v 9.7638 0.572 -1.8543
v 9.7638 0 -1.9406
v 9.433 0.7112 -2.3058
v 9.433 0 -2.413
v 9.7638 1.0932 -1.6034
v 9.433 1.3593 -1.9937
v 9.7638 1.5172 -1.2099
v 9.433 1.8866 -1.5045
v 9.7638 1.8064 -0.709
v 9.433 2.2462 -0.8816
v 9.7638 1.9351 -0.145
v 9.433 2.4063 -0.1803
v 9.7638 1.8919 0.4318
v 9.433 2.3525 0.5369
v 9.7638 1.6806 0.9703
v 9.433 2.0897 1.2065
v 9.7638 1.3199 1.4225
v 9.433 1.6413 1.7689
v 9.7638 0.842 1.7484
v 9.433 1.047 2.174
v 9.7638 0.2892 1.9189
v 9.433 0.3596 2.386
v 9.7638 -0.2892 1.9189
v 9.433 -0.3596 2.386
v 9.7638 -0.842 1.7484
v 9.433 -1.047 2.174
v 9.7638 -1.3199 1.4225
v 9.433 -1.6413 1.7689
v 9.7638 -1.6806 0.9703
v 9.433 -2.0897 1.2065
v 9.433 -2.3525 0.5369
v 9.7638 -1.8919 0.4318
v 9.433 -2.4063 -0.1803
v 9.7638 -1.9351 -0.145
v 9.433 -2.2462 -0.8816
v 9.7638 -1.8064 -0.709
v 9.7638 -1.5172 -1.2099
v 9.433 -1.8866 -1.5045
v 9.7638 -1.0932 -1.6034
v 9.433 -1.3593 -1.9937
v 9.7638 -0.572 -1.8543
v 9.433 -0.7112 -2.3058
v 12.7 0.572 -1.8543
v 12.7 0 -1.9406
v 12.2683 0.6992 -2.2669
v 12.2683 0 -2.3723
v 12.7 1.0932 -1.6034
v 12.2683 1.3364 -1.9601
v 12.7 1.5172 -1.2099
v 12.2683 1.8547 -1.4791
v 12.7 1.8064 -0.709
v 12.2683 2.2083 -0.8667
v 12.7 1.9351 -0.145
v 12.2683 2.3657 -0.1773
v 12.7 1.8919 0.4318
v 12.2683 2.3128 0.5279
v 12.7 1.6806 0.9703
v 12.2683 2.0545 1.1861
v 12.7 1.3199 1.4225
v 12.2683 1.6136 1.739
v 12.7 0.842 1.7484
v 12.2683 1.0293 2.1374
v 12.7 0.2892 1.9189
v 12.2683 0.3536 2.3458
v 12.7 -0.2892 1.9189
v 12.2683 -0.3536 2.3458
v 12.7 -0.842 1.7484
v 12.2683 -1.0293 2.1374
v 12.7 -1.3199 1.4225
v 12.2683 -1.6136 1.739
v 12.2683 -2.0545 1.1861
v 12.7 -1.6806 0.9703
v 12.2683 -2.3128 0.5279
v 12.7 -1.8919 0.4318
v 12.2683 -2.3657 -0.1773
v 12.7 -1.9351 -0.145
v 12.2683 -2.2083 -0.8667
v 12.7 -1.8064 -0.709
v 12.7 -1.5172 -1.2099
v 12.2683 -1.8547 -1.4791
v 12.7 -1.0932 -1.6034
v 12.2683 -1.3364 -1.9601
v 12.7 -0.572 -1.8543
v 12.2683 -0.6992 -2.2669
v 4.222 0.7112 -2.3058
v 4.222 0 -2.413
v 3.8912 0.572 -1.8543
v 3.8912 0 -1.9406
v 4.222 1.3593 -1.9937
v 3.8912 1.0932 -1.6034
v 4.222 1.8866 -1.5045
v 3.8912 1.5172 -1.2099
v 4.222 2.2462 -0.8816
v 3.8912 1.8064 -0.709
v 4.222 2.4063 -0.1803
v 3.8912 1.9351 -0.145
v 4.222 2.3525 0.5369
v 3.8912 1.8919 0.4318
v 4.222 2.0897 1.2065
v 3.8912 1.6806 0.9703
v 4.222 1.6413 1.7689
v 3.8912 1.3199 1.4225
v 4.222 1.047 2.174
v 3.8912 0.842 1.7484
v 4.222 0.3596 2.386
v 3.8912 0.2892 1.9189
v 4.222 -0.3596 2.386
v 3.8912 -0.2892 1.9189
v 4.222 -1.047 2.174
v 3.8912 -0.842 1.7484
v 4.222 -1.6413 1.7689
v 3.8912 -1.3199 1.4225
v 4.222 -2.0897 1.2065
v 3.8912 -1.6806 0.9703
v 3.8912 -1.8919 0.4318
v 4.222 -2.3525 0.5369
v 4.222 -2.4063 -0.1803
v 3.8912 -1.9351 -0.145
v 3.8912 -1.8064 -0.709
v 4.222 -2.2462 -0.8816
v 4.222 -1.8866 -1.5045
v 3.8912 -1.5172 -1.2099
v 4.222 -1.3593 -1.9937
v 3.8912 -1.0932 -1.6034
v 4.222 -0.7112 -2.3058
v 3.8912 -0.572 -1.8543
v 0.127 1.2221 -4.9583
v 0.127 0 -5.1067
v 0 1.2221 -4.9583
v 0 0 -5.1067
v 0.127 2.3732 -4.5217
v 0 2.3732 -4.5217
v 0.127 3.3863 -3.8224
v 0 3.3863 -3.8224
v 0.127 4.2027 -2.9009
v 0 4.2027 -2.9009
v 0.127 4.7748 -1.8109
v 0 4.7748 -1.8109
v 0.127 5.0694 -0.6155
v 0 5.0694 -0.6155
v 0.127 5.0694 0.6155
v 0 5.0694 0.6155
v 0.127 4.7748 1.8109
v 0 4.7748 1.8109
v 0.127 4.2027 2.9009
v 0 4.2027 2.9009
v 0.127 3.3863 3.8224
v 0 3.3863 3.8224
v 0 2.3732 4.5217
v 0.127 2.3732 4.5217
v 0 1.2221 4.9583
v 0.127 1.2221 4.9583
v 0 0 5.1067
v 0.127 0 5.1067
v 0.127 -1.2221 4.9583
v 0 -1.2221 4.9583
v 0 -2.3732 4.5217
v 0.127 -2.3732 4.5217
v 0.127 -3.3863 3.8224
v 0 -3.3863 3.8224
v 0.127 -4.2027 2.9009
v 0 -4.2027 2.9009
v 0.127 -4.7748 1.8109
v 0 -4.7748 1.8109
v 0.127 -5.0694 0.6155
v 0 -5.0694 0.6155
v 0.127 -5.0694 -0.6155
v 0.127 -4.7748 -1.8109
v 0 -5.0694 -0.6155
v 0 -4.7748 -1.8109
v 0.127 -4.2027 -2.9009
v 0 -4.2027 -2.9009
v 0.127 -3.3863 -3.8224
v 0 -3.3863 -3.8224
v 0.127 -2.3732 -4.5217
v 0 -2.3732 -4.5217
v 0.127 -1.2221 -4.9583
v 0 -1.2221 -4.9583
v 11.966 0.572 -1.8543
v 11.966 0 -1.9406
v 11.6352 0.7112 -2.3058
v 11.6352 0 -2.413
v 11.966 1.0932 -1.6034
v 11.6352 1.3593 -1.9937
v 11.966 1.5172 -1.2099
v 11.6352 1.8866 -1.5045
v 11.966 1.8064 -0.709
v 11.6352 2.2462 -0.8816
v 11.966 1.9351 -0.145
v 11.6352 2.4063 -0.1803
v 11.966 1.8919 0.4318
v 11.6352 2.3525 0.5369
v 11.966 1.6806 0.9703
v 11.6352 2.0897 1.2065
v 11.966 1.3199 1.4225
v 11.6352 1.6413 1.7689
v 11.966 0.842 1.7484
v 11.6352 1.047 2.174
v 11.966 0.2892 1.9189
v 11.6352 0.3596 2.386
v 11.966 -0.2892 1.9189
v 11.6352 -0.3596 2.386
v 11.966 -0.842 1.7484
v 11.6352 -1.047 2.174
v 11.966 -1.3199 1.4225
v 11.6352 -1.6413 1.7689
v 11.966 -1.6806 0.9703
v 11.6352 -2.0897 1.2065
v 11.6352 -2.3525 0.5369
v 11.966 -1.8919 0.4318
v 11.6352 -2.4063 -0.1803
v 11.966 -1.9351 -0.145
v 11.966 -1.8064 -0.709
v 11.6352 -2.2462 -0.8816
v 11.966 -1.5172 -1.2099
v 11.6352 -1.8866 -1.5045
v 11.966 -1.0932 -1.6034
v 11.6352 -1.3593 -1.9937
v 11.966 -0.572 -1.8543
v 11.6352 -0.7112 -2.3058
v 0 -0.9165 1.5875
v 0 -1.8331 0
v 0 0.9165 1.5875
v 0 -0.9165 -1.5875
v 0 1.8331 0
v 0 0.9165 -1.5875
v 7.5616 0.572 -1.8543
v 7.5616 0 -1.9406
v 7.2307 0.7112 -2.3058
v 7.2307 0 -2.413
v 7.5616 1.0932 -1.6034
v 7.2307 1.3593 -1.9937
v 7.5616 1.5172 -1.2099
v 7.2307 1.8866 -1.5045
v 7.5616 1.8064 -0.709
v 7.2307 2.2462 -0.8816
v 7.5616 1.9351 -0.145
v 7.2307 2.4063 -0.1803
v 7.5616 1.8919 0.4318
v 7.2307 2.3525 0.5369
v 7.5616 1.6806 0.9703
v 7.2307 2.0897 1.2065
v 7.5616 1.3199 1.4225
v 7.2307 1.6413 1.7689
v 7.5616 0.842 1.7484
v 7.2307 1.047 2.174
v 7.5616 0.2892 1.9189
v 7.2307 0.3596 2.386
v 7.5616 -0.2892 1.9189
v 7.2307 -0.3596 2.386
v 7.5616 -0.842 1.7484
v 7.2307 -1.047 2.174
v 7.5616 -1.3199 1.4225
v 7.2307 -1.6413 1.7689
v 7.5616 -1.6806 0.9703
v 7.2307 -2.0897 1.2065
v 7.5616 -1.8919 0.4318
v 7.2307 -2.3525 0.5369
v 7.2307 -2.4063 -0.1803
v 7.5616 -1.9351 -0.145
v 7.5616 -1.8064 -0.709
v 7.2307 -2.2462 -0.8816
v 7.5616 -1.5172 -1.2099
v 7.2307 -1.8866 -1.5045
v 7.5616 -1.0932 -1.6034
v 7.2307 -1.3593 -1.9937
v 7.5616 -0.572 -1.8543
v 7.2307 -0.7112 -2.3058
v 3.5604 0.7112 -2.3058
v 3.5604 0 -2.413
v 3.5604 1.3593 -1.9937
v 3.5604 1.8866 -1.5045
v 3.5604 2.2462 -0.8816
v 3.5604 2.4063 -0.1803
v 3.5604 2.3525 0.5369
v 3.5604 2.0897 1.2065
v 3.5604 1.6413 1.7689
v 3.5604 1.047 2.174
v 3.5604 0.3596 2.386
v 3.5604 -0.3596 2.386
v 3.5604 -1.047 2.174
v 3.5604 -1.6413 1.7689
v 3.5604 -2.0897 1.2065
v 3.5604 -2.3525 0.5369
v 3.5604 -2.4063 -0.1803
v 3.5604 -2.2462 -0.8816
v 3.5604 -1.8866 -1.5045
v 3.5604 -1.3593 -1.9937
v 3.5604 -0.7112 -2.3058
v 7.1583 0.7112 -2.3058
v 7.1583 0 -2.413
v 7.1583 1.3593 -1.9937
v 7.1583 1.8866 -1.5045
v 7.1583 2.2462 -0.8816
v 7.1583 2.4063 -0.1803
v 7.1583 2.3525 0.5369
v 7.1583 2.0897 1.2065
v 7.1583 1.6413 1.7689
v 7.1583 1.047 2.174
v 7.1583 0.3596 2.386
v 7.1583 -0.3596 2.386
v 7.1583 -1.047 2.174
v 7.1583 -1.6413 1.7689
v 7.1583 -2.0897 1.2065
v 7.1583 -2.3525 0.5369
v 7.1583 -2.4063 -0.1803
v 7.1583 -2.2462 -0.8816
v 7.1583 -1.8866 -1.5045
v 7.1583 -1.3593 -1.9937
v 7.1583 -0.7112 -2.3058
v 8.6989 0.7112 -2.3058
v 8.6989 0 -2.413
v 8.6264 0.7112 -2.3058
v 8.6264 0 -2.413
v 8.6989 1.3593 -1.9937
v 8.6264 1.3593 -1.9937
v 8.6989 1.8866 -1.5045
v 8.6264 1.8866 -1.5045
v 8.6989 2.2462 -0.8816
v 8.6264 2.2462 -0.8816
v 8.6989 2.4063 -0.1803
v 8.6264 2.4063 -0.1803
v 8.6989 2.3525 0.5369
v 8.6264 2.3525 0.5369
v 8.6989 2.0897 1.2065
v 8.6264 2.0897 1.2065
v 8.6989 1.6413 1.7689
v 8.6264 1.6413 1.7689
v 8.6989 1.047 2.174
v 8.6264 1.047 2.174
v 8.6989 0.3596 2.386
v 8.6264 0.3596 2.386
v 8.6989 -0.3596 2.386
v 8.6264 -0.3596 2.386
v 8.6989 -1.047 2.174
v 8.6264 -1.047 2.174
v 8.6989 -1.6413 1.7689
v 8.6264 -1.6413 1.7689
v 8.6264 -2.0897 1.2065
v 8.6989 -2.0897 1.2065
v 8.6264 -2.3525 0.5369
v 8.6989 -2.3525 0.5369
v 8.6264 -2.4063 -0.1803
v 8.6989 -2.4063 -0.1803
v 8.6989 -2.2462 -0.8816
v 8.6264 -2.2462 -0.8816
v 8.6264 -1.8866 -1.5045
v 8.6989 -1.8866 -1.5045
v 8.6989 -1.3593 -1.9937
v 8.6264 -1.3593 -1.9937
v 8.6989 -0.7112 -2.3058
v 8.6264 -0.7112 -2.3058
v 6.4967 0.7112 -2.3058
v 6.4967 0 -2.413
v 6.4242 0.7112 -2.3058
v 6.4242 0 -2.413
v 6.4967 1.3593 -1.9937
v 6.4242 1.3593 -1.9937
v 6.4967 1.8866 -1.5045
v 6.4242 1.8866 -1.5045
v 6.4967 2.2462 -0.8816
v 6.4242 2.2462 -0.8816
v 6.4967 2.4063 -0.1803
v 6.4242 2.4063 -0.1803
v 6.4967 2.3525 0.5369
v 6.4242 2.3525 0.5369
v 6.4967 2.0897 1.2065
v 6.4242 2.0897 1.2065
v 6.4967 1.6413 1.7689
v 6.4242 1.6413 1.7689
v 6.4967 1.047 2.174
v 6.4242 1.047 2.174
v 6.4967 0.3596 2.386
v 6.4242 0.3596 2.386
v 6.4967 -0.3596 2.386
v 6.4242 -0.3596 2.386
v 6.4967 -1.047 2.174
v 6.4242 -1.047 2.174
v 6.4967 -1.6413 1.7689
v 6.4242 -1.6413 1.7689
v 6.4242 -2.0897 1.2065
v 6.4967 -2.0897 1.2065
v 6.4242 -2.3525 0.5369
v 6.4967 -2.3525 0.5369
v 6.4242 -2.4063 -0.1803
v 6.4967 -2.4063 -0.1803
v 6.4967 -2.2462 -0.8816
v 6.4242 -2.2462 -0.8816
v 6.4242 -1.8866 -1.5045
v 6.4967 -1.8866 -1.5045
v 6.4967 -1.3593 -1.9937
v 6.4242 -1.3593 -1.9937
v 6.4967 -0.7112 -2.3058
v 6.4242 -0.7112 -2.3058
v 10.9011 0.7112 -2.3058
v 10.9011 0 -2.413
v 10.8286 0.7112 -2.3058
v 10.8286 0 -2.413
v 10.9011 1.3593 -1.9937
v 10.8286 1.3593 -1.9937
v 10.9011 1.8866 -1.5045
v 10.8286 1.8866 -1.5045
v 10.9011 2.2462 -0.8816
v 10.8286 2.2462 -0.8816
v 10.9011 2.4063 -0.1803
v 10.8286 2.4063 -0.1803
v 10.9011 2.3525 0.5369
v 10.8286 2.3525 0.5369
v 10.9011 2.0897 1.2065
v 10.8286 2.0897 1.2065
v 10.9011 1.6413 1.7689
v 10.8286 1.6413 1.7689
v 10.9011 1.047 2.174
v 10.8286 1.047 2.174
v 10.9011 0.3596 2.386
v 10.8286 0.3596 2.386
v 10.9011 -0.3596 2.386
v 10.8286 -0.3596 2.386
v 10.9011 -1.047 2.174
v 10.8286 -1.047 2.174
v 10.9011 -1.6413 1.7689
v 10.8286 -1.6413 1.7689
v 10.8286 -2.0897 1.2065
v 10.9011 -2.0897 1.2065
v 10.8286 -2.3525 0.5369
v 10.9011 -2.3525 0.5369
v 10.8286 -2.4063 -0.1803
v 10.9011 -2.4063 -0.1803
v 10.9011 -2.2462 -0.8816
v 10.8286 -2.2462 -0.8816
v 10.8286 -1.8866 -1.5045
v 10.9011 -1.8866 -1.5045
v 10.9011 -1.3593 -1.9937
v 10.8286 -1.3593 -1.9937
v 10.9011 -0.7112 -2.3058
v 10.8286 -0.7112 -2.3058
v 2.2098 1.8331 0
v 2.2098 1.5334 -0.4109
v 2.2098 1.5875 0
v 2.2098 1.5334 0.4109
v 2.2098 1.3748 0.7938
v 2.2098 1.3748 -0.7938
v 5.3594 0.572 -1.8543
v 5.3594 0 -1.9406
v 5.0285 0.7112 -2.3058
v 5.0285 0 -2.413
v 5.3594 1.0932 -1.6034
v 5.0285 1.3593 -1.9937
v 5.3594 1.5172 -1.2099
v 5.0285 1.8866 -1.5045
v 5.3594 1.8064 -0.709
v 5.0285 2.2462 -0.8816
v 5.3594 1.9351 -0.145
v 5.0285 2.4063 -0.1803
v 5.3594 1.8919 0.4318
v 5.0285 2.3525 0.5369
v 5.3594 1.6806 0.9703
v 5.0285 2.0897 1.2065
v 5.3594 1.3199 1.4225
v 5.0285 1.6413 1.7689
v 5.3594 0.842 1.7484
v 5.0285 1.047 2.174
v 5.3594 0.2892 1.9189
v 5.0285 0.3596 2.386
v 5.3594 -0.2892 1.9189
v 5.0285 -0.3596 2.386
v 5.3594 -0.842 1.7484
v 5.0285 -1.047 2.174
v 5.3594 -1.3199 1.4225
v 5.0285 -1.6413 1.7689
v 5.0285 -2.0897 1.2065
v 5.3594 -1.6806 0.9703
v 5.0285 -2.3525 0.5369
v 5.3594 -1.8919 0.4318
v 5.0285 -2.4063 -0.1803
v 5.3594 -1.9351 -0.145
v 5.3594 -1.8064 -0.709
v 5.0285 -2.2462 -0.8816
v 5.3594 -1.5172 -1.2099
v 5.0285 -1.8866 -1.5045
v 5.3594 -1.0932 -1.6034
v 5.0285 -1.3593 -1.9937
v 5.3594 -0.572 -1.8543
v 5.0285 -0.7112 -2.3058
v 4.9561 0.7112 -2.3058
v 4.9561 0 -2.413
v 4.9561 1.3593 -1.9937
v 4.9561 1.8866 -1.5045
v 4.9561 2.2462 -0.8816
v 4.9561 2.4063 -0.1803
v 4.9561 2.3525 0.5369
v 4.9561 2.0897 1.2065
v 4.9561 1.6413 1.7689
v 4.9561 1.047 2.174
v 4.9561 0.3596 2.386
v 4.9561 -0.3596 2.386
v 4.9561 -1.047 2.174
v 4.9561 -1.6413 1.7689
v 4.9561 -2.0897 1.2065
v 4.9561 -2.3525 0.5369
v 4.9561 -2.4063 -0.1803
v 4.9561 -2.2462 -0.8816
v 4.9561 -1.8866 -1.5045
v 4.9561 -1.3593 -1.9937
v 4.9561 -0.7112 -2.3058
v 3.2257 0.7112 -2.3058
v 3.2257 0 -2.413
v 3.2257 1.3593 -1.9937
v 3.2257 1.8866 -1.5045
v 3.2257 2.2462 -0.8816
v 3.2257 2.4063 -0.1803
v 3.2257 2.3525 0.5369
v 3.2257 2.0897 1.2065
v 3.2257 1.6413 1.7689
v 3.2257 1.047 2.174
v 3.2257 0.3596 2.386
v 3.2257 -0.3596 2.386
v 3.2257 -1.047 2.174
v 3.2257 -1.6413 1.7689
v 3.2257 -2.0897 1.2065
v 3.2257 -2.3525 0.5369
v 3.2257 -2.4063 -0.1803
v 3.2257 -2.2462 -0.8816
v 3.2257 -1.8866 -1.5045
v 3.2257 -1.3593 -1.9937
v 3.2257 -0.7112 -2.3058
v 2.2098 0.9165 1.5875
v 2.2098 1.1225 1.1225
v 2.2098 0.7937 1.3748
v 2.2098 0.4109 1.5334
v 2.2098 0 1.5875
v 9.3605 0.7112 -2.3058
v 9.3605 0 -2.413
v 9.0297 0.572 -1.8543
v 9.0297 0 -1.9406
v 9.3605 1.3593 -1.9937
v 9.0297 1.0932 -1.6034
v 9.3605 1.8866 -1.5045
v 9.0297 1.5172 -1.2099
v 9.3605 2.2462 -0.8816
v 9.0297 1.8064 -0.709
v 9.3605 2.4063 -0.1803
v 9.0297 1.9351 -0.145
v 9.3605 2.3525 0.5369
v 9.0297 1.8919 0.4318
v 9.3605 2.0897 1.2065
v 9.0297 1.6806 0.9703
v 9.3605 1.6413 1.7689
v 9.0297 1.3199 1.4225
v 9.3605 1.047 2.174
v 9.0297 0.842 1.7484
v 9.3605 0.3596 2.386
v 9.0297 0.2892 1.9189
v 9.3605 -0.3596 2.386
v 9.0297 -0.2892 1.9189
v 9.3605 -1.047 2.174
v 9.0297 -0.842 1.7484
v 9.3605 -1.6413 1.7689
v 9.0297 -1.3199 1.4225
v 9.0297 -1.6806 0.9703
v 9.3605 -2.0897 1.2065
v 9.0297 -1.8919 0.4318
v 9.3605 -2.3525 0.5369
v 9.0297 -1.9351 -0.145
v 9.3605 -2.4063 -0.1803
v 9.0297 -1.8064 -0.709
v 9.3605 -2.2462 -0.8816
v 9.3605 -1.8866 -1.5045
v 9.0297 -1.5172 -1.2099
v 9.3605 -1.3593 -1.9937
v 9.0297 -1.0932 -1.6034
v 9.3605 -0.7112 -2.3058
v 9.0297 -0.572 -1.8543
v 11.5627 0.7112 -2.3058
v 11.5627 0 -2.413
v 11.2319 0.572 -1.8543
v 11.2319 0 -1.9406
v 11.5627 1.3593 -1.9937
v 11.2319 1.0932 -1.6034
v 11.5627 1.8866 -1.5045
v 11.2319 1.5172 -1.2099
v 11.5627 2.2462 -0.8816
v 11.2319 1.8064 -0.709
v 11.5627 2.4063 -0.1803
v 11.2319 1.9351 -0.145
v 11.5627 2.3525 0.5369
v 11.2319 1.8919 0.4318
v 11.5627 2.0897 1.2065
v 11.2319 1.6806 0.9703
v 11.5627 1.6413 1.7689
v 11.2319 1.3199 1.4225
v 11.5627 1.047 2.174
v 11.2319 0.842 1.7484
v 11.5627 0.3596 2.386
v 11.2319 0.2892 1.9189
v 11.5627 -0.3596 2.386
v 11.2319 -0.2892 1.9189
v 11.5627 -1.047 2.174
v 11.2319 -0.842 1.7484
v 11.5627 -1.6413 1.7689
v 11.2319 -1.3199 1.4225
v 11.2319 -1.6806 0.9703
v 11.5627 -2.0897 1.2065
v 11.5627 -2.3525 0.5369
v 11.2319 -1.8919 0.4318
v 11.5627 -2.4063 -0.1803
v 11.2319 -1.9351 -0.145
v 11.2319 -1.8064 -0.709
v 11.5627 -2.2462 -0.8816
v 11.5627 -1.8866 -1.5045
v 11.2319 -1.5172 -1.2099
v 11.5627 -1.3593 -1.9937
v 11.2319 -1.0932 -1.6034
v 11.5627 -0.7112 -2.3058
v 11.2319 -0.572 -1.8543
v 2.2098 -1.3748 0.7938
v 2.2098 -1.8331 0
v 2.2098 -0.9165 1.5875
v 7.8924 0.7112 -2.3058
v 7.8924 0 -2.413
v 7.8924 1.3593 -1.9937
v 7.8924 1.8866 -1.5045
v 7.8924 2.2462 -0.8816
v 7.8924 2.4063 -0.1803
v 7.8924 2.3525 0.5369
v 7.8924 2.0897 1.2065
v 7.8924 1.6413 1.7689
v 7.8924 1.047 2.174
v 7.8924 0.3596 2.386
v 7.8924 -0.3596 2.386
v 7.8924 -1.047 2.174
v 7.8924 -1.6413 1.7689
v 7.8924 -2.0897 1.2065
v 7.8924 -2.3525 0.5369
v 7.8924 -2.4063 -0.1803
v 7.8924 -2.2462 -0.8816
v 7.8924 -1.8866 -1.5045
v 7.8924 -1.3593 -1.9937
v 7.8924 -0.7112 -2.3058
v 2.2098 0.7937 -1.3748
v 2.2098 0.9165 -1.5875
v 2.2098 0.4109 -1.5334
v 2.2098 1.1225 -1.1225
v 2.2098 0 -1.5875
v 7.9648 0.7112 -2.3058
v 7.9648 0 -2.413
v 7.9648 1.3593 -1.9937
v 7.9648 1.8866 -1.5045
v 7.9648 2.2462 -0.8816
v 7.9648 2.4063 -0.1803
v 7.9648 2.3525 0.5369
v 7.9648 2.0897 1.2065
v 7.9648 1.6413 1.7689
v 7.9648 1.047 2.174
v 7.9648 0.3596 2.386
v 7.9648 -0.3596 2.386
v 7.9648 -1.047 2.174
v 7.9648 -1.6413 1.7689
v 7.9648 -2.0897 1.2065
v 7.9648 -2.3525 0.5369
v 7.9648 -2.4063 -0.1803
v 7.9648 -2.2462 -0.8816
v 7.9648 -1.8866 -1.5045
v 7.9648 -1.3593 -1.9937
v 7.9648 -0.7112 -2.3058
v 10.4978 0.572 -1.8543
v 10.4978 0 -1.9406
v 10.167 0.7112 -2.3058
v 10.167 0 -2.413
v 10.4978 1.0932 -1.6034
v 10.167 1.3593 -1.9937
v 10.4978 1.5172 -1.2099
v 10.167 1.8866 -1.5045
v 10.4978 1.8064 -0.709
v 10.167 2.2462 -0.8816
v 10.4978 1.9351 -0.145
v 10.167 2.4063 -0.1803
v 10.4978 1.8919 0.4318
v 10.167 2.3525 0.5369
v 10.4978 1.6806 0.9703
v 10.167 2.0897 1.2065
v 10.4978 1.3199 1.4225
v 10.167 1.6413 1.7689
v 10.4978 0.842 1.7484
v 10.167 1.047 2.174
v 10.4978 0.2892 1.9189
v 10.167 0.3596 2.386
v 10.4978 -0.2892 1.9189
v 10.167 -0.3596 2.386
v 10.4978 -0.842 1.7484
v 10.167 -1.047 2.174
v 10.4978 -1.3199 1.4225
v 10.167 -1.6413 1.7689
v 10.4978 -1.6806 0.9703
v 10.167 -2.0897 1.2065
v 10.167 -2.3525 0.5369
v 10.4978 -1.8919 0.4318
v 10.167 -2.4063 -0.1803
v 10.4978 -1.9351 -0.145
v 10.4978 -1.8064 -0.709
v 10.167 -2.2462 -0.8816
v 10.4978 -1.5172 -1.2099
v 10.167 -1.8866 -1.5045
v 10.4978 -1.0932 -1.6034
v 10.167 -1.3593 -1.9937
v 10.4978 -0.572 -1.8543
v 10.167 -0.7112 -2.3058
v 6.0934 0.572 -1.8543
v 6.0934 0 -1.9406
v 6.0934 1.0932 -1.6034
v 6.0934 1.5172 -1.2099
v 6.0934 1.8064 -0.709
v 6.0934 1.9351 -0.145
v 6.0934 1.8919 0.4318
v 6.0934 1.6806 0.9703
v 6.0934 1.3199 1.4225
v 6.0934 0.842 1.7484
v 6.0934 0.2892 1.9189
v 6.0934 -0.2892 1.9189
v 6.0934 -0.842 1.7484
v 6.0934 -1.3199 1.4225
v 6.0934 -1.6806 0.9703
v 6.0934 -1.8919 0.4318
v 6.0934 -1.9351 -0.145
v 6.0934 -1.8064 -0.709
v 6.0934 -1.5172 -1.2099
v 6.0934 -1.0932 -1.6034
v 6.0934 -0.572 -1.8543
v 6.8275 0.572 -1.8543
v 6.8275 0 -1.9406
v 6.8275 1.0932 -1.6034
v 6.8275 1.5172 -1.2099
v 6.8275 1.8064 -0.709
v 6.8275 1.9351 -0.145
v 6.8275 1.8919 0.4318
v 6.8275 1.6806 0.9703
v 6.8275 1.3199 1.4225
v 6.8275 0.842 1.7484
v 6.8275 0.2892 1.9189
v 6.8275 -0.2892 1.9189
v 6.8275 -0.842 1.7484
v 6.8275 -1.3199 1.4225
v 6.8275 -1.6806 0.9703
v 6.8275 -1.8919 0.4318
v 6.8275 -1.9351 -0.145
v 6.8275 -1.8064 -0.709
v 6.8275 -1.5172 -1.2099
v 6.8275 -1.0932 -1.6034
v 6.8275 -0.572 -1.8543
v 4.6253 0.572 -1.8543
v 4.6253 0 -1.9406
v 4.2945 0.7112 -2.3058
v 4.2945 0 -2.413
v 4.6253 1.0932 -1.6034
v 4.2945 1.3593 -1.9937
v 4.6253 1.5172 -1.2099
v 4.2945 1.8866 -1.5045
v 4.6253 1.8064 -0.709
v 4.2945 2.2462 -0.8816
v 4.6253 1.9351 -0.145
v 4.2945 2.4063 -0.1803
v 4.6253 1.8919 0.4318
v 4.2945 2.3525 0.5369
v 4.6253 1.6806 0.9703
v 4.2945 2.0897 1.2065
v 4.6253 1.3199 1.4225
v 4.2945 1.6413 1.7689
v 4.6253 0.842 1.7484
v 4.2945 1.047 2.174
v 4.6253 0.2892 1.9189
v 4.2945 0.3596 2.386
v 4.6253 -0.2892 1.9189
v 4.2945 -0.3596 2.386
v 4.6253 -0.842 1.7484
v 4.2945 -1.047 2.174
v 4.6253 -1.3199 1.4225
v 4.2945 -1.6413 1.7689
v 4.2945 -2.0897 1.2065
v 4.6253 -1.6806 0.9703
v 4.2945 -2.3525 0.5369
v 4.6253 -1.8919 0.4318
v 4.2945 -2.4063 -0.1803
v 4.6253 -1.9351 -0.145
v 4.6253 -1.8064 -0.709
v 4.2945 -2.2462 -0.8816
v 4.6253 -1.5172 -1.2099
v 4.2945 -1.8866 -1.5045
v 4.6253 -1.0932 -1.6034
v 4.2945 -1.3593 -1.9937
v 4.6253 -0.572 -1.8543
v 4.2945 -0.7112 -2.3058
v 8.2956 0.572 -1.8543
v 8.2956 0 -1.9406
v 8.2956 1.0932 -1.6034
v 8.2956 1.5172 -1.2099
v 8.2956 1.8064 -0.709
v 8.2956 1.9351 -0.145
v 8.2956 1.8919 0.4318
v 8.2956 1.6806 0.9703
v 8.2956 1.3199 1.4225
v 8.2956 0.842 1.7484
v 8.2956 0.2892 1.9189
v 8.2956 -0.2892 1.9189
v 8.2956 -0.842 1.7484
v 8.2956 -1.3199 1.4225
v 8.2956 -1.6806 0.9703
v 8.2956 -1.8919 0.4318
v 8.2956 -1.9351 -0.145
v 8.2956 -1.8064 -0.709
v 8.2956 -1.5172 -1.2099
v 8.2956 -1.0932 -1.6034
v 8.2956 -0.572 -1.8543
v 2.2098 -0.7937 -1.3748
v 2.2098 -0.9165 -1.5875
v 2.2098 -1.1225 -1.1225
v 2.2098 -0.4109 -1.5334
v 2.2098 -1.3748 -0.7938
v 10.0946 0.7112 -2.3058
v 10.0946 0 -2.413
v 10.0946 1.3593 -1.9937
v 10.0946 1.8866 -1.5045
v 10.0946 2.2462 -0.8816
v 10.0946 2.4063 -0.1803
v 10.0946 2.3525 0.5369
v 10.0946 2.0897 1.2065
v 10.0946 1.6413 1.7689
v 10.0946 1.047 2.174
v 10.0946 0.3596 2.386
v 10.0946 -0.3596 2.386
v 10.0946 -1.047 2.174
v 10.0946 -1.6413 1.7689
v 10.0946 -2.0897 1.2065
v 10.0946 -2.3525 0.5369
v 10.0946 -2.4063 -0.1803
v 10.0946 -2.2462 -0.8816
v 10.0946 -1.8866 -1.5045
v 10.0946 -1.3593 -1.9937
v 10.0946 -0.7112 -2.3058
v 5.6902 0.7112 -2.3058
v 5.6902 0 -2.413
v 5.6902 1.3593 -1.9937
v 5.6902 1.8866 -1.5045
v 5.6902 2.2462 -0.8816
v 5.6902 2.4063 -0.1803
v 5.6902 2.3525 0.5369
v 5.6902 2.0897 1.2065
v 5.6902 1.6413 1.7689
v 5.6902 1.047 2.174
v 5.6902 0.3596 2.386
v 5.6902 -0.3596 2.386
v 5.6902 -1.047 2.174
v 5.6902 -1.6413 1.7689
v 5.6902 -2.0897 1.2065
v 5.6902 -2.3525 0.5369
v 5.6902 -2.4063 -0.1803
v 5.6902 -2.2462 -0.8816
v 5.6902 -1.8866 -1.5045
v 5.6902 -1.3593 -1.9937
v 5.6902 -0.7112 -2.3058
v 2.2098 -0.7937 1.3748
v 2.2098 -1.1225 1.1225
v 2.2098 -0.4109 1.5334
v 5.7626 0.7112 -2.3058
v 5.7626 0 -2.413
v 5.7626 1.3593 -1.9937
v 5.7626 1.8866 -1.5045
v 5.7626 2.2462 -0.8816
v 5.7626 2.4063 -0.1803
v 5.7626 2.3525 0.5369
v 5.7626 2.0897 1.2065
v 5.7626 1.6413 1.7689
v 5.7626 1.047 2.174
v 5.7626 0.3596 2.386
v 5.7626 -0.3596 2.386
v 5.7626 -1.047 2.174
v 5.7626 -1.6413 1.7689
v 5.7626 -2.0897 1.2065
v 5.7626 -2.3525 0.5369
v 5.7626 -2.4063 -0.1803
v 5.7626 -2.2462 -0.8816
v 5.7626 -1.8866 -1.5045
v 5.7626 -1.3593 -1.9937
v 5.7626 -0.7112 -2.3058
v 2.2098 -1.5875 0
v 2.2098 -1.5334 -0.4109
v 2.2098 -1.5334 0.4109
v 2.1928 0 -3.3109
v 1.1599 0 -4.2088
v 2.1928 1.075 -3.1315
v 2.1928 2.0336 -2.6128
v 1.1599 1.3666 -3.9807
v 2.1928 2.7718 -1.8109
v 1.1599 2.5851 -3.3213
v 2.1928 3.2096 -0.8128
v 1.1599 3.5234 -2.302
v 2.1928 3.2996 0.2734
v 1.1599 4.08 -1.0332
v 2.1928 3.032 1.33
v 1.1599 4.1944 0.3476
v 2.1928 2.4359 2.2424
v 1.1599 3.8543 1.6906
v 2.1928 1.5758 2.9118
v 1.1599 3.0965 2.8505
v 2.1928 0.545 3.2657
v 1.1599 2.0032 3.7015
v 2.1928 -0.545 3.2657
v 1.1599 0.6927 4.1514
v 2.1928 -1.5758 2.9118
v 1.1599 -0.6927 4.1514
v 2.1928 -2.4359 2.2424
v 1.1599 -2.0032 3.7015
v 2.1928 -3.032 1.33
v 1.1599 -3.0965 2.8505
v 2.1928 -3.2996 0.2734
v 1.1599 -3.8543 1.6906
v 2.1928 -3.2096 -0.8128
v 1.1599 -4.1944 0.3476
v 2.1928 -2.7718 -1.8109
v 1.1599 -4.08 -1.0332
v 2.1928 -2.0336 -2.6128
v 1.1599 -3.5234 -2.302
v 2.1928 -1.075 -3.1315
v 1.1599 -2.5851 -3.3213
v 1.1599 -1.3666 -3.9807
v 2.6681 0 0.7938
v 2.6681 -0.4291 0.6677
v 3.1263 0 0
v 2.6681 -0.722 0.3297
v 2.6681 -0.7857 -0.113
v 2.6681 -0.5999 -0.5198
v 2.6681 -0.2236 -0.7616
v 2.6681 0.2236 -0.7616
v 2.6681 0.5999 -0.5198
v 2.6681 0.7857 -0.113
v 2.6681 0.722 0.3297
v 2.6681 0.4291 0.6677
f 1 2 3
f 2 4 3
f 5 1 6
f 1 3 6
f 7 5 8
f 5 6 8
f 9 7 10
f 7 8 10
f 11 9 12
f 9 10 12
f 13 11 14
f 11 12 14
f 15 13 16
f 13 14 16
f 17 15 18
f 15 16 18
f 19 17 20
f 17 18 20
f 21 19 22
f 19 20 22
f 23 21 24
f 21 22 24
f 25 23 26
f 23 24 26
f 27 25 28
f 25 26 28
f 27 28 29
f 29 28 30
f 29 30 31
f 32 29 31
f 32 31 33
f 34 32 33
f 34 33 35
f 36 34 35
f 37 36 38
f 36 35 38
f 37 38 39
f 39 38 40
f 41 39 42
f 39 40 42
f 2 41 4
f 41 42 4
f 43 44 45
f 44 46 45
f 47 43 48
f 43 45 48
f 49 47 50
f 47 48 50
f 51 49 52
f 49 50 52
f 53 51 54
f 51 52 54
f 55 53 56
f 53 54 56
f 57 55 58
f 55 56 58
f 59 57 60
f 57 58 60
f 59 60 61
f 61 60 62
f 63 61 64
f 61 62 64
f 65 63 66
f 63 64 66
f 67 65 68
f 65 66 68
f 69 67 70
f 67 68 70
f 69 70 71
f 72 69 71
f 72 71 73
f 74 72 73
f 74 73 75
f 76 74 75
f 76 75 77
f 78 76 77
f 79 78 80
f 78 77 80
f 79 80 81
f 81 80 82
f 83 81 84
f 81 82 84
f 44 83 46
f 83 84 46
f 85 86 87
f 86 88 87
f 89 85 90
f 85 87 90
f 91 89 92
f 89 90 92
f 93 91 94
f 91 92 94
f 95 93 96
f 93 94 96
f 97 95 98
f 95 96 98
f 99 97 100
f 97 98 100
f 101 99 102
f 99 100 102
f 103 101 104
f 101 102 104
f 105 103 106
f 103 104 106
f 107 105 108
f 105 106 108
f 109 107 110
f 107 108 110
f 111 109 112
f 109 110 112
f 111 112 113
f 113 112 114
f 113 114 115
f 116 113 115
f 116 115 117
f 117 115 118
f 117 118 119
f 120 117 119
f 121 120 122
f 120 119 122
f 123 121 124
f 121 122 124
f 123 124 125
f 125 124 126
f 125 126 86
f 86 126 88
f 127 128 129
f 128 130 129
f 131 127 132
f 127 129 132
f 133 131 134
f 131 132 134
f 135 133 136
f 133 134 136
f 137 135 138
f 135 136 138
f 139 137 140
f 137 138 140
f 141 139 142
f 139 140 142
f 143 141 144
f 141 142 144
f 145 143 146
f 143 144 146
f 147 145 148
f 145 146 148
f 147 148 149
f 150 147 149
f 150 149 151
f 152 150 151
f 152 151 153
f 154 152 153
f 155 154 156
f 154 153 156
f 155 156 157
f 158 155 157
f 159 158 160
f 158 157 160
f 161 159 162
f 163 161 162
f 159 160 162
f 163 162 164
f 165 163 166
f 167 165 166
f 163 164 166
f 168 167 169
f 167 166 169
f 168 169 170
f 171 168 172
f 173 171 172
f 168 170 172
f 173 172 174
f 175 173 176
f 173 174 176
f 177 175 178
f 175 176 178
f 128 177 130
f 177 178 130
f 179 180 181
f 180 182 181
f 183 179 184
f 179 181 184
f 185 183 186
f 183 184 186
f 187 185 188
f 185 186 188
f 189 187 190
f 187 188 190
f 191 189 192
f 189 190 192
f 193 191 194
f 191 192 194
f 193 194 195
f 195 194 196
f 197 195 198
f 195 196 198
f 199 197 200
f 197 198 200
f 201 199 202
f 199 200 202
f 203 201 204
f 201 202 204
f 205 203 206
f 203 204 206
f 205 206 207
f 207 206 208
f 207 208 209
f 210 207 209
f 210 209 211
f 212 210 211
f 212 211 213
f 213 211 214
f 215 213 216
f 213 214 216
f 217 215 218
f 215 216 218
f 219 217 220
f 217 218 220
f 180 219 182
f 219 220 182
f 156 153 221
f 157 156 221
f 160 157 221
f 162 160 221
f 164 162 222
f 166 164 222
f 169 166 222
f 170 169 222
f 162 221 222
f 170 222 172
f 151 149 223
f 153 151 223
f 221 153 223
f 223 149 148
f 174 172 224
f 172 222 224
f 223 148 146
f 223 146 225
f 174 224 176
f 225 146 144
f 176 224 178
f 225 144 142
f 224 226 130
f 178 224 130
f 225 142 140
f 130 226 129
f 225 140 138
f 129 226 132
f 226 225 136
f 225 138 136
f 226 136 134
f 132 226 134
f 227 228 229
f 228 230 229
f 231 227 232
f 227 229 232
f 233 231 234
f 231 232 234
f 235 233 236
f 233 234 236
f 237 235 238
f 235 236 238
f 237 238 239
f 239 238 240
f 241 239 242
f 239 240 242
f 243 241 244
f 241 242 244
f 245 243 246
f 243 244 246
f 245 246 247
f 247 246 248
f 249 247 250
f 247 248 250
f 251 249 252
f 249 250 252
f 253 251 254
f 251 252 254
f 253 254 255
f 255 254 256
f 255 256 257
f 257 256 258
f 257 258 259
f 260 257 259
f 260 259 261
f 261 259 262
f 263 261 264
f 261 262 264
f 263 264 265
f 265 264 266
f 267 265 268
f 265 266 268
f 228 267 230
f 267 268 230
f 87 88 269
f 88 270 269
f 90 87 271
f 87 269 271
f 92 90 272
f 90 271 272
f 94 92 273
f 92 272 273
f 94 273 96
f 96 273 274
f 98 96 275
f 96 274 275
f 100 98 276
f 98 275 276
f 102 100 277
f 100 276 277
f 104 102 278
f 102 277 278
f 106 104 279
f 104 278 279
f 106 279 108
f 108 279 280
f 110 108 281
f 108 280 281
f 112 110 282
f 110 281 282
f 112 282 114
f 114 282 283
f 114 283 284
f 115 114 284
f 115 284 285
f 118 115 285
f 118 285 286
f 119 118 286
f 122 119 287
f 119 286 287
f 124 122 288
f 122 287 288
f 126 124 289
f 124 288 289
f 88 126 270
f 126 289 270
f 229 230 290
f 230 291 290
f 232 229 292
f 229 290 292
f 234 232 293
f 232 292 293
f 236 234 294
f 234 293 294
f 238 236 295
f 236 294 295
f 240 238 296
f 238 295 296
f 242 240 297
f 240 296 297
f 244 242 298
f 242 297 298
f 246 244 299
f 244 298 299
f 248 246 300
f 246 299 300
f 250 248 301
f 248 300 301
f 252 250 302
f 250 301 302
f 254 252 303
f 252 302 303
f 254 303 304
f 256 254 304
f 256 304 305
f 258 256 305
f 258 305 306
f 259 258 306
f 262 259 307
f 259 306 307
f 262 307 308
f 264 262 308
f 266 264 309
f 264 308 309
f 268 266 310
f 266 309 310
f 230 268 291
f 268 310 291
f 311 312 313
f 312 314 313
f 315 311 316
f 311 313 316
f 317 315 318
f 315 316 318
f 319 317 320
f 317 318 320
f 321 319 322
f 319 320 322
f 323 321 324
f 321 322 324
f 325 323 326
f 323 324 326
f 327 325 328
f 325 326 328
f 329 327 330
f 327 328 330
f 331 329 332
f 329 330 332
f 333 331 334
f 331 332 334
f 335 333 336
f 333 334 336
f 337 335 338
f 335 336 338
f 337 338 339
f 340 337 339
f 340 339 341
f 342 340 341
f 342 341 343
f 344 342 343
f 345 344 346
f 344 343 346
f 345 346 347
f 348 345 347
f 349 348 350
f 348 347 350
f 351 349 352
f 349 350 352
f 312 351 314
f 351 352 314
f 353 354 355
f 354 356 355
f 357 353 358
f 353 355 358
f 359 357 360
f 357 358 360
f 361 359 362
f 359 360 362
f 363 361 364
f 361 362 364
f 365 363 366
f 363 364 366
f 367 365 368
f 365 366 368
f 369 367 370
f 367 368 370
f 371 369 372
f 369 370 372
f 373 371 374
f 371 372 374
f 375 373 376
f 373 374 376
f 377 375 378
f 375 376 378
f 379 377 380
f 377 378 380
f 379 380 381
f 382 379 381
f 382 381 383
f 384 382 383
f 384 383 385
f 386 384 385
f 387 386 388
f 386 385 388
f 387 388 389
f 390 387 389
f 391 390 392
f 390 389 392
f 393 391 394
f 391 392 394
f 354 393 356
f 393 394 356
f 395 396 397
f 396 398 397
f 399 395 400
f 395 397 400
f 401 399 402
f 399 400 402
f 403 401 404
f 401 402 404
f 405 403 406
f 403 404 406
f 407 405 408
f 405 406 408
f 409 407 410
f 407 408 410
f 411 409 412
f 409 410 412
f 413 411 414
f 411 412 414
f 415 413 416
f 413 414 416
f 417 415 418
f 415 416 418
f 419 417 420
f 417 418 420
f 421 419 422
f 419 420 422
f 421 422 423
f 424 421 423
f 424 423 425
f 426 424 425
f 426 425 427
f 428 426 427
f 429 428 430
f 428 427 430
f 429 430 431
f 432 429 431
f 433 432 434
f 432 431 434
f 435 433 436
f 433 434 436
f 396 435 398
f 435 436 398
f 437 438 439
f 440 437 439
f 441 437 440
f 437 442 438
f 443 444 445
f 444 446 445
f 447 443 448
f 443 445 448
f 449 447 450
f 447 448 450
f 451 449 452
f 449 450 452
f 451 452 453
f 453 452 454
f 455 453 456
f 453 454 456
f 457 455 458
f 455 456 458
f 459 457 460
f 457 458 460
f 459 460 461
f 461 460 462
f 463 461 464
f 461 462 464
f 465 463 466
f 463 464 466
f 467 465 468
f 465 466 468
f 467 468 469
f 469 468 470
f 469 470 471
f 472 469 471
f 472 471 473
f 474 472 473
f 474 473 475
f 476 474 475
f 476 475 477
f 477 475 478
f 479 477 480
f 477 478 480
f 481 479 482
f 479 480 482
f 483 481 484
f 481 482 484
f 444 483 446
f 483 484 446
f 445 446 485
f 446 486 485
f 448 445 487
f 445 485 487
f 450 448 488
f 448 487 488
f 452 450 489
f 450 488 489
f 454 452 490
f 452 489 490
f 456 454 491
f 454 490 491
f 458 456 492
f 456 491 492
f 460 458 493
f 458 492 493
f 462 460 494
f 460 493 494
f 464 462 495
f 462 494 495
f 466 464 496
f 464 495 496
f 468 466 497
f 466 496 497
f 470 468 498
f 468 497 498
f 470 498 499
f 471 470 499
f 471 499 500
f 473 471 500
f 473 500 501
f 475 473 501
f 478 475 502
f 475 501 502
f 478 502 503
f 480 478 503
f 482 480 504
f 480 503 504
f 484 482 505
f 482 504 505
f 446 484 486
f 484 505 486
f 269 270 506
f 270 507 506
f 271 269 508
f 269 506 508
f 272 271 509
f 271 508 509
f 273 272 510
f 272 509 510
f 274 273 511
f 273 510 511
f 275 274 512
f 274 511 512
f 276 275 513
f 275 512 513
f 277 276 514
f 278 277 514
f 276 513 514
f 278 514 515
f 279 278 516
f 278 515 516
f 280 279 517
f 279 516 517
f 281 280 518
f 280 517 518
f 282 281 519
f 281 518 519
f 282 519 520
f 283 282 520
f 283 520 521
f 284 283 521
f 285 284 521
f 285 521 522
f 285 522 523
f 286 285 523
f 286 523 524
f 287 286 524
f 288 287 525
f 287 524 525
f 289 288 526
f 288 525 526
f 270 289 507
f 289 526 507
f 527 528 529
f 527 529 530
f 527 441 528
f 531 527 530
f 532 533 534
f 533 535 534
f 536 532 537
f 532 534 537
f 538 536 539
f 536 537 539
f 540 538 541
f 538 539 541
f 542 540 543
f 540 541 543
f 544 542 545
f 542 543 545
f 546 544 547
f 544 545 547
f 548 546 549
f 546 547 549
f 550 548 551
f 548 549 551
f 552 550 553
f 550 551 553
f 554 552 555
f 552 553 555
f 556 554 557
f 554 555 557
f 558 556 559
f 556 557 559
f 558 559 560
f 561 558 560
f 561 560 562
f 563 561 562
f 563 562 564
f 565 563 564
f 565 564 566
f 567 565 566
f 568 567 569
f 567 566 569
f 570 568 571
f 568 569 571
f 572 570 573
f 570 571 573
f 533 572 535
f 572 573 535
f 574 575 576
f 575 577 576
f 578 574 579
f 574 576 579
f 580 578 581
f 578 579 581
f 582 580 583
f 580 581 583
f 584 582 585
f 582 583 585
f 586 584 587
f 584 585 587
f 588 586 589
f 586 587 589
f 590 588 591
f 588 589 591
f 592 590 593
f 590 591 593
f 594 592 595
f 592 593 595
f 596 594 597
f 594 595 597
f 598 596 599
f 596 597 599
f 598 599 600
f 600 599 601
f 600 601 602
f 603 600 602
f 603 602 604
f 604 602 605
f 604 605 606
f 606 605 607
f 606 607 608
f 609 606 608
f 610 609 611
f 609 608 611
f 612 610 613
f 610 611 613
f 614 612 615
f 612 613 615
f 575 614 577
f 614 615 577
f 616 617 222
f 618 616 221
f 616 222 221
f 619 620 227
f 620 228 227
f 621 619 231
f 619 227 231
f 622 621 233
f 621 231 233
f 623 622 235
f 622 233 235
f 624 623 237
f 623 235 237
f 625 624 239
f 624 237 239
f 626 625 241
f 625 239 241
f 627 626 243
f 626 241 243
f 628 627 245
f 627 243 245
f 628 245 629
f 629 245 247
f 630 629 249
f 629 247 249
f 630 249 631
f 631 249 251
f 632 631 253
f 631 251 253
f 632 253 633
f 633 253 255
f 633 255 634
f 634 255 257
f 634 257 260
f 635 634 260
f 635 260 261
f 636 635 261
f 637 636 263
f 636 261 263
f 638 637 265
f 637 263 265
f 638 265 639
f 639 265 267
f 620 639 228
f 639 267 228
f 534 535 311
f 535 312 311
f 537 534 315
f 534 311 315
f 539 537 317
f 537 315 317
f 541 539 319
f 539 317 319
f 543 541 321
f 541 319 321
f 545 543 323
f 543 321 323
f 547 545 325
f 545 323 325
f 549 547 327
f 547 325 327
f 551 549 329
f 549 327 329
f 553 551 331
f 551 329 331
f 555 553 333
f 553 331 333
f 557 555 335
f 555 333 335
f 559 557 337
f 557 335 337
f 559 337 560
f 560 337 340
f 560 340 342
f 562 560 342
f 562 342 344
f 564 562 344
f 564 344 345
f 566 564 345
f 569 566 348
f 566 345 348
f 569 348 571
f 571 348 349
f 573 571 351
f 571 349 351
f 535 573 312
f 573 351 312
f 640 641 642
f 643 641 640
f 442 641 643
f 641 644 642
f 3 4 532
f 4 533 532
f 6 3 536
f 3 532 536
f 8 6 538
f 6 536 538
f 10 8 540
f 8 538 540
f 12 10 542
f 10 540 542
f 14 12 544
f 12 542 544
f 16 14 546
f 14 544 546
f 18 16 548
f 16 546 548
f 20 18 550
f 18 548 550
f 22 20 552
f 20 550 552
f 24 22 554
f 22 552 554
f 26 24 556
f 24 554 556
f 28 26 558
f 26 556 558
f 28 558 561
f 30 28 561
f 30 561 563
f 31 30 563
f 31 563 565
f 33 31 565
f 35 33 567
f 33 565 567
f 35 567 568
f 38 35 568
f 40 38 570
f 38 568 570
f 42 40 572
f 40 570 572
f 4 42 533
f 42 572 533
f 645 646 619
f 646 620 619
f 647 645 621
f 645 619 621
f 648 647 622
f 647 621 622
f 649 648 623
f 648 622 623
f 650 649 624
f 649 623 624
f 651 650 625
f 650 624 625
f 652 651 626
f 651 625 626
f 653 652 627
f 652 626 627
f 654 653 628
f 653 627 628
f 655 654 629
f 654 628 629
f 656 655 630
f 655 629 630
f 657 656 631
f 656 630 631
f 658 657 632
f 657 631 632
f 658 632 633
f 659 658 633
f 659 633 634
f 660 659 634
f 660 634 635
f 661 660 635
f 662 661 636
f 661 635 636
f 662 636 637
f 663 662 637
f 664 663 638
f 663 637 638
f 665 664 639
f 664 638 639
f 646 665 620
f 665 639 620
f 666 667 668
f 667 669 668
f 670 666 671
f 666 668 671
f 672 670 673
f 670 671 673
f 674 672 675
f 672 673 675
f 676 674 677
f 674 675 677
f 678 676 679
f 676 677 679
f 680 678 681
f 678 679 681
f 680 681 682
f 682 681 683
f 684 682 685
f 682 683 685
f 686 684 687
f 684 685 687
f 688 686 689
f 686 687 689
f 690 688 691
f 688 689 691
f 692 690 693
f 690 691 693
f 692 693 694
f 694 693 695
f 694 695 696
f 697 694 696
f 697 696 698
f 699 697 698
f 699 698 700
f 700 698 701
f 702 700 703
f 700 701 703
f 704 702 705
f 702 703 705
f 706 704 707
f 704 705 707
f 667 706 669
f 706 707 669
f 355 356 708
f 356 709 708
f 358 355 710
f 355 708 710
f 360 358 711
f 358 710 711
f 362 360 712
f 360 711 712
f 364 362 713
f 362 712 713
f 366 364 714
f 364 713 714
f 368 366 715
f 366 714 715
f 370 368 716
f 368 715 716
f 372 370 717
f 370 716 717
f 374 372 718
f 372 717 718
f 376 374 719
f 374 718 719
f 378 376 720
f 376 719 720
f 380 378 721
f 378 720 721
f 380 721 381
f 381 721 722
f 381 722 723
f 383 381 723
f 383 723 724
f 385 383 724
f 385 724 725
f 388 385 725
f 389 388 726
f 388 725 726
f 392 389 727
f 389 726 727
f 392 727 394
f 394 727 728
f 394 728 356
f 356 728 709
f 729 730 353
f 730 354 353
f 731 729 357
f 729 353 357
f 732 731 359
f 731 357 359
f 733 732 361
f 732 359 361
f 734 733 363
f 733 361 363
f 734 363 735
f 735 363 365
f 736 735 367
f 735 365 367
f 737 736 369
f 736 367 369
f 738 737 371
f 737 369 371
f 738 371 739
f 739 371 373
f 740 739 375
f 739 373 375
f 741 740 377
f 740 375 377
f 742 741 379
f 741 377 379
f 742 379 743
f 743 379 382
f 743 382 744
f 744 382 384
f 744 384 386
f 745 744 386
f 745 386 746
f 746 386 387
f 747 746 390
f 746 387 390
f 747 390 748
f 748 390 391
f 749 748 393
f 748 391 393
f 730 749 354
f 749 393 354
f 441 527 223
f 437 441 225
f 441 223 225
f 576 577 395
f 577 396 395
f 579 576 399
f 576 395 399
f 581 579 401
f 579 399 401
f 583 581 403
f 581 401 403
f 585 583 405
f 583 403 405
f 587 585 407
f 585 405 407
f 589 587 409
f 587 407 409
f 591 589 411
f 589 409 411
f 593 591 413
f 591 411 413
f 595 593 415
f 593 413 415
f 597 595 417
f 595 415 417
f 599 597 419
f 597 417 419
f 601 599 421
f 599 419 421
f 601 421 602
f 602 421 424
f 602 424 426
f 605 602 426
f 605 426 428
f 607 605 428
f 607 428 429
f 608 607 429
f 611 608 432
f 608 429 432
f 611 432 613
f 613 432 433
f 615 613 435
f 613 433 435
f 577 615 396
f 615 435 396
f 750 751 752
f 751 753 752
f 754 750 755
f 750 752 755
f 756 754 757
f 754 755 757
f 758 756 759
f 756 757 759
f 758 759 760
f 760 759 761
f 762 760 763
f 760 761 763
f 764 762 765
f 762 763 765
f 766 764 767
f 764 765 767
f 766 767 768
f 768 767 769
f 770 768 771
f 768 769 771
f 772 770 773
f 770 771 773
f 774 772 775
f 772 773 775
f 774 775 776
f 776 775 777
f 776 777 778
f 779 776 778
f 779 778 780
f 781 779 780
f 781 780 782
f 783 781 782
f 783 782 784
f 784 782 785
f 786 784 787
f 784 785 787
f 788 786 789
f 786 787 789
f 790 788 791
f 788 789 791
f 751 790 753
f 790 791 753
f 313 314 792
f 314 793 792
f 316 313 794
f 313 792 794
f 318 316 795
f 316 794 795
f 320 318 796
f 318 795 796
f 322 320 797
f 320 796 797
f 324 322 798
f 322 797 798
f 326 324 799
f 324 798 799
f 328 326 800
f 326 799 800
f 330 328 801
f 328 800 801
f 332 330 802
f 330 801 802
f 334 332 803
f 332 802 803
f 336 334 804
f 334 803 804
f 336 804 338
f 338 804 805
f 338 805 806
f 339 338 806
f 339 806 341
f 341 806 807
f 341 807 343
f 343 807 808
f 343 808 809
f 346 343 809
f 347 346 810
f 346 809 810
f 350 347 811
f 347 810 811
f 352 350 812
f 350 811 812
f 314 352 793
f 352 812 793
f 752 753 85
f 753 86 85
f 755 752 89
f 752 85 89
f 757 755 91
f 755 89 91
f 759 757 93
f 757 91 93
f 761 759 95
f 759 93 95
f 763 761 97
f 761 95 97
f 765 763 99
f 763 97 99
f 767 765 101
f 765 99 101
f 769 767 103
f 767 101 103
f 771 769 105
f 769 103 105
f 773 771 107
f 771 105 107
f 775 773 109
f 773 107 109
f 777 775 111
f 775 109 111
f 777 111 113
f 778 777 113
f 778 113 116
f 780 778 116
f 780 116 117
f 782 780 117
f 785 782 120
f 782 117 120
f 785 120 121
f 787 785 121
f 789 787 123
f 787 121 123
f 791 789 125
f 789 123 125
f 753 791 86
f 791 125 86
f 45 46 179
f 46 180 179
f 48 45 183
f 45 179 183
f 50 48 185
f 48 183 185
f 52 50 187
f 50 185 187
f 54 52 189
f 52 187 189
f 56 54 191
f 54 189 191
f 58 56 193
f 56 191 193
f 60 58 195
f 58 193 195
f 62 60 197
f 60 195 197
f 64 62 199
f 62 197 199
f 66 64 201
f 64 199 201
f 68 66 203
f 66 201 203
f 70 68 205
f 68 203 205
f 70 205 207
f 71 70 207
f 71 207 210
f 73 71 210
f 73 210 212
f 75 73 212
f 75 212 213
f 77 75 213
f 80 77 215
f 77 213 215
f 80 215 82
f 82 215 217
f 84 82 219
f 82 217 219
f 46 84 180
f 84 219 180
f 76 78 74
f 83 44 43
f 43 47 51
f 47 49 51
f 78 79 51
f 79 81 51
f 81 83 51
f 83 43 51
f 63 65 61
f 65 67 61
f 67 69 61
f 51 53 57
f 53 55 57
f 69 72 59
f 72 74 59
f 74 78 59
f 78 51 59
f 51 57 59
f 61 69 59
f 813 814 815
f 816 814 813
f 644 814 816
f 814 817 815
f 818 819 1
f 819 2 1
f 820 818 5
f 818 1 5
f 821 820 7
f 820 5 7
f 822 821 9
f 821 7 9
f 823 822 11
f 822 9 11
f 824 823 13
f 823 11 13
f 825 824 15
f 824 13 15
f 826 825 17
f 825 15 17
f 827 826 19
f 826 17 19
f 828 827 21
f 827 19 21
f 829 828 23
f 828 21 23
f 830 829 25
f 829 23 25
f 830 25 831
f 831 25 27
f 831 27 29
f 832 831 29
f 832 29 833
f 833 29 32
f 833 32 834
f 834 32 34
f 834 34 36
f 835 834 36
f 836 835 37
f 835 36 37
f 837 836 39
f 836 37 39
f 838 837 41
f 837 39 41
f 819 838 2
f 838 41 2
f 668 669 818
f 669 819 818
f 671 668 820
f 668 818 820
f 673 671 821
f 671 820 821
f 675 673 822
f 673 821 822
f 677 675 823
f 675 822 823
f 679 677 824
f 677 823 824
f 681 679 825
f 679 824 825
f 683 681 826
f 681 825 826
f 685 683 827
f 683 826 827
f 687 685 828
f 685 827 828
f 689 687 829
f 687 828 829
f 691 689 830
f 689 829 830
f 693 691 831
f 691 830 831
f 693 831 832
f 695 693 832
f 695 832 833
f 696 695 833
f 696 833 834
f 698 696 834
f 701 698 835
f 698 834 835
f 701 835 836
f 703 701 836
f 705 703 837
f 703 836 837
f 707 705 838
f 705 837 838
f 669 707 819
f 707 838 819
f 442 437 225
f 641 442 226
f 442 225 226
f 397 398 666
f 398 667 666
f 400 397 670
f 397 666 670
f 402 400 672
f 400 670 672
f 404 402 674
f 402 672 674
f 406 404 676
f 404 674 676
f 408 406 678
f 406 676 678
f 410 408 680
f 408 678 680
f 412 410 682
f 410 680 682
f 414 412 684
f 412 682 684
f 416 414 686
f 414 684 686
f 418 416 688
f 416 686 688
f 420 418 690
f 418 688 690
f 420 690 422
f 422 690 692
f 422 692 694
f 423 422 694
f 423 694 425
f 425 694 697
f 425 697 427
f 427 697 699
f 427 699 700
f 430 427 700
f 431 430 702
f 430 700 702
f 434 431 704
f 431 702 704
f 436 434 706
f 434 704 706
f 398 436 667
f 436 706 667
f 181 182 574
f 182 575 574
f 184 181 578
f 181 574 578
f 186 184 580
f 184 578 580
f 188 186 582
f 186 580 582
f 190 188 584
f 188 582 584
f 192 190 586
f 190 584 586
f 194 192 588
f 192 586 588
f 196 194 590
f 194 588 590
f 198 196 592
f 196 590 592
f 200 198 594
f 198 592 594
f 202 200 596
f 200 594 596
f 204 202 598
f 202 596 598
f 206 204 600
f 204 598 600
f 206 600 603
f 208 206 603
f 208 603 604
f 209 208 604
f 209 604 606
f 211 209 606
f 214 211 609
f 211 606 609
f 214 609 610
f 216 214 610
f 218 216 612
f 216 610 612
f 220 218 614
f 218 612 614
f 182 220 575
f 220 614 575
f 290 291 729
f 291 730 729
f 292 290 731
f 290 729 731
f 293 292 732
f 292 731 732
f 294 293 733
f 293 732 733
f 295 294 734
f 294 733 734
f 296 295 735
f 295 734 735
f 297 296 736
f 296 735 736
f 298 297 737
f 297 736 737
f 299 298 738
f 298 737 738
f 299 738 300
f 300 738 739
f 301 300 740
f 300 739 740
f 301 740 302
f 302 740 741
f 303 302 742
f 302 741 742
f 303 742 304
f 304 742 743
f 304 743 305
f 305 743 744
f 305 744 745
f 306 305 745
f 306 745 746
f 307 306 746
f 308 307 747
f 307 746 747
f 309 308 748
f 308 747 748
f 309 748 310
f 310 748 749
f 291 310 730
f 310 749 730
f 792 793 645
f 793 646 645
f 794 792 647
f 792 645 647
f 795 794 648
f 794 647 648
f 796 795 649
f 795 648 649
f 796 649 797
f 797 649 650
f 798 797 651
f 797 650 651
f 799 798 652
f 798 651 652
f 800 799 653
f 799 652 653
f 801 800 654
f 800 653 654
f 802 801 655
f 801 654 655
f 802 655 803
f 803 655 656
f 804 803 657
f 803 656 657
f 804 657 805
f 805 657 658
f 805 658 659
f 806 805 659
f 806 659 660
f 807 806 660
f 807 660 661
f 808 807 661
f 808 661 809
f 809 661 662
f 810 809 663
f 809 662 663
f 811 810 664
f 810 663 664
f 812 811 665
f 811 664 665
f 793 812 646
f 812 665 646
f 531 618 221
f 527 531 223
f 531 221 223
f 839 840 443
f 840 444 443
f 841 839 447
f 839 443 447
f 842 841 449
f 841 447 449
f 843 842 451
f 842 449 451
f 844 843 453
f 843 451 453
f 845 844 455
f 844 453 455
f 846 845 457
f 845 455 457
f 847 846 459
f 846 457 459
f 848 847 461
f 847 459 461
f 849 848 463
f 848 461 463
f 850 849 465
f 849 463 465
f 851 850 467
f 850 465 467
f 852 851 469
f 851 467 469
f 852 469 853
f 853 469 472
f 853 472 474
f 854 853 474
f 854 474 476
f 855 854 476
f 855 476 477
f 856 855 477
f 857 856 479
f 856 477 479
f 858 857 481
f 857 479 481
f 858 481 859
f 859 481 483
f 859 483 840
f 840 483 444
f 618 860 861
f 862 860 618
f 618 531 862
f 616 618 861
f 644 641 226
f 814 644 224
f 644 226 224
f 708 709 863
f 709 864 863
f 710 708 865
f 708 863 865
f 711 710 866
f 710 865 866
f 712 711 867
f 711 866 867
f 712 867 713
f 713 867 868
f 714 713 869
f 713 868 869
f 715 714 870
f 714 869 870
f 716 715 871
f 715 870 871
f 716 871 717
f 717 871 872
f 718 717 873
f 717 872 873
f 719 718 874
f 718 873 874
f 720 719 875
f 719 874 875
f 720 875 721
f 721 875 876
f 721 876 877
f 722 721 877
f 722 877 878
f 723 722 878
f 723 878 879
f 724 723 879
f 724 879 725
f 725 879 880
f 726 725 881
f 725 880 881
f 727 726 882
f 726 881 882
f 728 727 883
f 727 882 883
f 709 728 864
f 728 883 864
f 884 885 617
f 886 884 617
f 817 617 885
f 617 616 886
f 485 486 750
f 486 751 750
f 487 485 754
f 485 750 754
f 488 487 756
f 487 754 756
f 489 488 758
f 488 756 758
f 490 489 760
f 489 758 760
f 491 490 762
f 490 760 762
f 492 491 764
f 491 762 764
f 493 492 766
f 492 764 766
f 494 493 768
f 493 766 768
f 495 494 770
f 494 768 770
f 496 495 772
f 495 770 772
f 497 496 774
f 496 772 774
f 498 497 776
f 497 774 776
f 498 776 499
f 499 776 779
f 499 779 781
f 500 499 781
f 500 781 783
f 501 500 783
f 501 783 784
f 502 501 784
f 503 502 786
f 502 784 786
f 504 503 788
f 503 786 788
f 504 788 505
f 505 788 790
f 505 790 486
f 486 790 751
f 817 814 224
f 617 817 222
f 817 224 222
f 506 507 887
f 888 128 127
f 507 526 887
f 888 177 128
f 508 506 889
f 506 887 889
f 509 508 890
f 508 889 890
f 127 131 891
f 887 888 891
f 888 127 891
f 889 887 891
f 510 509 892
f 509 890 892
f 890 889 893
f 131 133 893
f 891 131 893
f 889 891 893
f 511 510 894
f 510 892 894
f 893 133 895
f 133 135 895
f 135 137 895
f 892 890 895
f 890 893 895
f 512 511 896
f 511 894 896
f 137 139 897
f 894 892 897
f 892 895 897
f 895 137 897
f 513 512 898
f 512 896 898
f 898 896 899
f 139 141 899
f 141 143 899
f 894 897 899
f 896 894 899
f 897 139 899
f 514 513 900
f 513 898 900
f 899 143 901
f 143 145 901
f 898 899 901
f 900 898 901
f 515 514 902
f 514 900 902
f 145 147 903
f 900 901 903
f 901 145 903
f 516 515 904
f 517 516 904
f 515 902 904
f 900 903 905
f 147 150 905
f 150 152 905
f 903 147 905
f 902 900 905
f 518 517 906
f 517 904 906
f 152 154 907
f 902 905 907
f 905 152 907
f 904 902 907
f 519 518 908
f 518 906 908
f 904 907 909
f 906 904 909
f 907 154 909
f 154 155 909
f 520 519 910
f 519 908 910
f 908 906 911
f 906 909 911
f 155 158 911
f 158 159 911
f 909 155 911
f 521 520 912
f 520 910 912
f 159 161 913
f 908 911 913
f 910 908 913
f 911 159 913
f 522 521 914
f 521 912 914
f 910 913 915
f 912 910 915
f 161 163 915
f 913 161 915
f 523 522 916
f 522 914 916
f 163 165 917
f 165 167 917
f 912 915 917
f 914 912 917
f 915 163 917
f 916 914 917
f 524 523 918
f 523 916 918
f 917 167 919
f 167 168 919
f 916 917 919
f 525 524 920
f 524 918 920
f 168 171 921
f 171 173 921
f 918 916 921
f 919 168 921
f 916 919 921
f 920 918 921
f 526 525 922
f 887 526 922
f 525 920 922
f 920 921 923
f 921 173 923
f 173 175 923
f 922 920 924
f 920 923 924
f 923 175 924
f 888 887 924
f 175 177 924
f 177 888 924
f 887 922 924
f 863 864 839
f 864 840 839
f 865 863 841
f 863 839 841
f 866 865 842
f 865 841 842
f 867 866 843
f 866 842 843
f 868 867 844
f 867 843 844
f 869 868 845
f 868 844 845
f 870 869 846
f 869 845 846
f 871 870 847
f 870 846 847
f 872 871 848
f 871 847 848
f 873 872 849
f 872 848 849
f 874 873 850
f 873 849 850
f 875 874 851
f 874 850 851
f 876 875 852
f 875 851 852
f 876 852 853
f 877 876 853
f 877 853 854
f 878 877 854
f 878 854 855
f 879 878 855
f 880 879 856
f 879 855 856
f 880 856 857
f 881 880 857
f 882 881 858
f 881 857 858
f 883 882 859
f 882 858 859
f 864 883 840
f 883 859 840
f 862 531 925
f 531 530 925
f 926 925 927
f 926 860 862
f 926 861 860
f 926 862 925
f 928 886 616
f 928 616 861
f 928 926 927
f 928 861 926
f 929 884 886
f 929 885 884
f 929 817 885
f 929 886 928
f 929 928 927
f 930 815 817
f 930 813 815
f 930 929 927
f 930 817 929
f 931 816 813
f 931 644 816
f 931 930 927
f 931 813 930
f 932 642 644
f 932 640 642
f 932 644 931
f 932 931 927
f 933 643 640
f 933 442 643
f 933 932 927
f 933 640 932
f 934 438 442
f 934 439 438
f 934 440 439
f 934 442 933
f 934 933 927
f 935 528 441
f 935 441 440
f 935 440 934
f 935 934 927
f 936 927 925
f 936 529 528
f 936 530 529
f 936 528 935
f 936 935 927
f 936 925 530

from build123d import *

# Parameters (mm, degrees)
CUT_EXTRUDE1_DEPTH = 2.2098


with BuildPart() as part:
    # Sketch1 → Revolve1 (revolve)
    with BuildSketch(Plane.XY, mode=Mode.PRIVATE) as revolve1_sk:
        Polygon((0, 5.10667), (0, 0), (12.7, 0), (12.7, 1.94056), (12.268263383, 2.372296616), (11.96595815, 1.94056), (11.635152101, 2.413), (11.56269695, 2.413), (11.2318909, 1.94056), (10.901084851, 2.413), (10.8286297, 2.413), (10.49782365, 1.94056), (10.167017601, 2.413), (10.09456245, 2.413), (9.7637564, 1.94056), (9.432950351, 2.413), (9.3604952, 2.413), (9.02968915, 1.94056), (8.698883101, 2.413), (8.62642795, 2.413), (8.2956219, 1.94056), (7.964815851, 2.413), (7.8923607, 2.413), (7.561554651, 1.94056), (7.230748601, 2.413), (7.15829345, 2.413), (6.827487401, 1.94056), (6.496681351, 2.413), (6.4242262, 2.413), (6.093420151, 1.94056), (5.762614101, 2.413), (5.69015895, 2.413), (5.359352901, 1.94056), (5.028546851, 2.413), (4.9560917, 2.413), (4.625285651, 1.94056), (4.294479601, 2.413), (4.22202445, 2.413), (3.891218401, 1.94056), (3.560412352, 2.413), (3.225712867, 2.413), (0.127, 5.10667), align=None)
    revolve(revolve1_sk.sketch.rotate(Axis((0, 0, 0), (1, 0, 0)), 270), axis=Axis((0, 0, 0), (1, 0, 0)))

    # Sketch2 → Cut-Extrude1 (cut)
    with BuildSketch(Plane.ZY):
        Polygon((0, 1.833087105), (-1.5875, 0.916543552), (-1.5875, -0.916543552), (0, -1.833087105), (1.5875, -0.916543552), (1.5875, 0.916543552), align=None)
    extrude(amount=-CUT_EXTRUDE1_DEPTH, mode=Mode.SUBTRACT)

    # Sketch3 → Cut-Revolve1 (revolve, cut)
    with BuildSketch(Plane.XY, mode=Mode.PRIVATE) as cut_revolve1_sk:
        Polygon((2.2098, 1.5875), (2.2098, 0), (3.126343553, 0), align=None)
    revolve(cut_revolve1_sk.sketch.rotate(Axis((2.209775, 0, 0), (1, 0, 0)), 90), axis=Axis((2.209775, 0, 0), (1, 0, 0)), mode=Mode.SUBTRACT)


solid = part.part
